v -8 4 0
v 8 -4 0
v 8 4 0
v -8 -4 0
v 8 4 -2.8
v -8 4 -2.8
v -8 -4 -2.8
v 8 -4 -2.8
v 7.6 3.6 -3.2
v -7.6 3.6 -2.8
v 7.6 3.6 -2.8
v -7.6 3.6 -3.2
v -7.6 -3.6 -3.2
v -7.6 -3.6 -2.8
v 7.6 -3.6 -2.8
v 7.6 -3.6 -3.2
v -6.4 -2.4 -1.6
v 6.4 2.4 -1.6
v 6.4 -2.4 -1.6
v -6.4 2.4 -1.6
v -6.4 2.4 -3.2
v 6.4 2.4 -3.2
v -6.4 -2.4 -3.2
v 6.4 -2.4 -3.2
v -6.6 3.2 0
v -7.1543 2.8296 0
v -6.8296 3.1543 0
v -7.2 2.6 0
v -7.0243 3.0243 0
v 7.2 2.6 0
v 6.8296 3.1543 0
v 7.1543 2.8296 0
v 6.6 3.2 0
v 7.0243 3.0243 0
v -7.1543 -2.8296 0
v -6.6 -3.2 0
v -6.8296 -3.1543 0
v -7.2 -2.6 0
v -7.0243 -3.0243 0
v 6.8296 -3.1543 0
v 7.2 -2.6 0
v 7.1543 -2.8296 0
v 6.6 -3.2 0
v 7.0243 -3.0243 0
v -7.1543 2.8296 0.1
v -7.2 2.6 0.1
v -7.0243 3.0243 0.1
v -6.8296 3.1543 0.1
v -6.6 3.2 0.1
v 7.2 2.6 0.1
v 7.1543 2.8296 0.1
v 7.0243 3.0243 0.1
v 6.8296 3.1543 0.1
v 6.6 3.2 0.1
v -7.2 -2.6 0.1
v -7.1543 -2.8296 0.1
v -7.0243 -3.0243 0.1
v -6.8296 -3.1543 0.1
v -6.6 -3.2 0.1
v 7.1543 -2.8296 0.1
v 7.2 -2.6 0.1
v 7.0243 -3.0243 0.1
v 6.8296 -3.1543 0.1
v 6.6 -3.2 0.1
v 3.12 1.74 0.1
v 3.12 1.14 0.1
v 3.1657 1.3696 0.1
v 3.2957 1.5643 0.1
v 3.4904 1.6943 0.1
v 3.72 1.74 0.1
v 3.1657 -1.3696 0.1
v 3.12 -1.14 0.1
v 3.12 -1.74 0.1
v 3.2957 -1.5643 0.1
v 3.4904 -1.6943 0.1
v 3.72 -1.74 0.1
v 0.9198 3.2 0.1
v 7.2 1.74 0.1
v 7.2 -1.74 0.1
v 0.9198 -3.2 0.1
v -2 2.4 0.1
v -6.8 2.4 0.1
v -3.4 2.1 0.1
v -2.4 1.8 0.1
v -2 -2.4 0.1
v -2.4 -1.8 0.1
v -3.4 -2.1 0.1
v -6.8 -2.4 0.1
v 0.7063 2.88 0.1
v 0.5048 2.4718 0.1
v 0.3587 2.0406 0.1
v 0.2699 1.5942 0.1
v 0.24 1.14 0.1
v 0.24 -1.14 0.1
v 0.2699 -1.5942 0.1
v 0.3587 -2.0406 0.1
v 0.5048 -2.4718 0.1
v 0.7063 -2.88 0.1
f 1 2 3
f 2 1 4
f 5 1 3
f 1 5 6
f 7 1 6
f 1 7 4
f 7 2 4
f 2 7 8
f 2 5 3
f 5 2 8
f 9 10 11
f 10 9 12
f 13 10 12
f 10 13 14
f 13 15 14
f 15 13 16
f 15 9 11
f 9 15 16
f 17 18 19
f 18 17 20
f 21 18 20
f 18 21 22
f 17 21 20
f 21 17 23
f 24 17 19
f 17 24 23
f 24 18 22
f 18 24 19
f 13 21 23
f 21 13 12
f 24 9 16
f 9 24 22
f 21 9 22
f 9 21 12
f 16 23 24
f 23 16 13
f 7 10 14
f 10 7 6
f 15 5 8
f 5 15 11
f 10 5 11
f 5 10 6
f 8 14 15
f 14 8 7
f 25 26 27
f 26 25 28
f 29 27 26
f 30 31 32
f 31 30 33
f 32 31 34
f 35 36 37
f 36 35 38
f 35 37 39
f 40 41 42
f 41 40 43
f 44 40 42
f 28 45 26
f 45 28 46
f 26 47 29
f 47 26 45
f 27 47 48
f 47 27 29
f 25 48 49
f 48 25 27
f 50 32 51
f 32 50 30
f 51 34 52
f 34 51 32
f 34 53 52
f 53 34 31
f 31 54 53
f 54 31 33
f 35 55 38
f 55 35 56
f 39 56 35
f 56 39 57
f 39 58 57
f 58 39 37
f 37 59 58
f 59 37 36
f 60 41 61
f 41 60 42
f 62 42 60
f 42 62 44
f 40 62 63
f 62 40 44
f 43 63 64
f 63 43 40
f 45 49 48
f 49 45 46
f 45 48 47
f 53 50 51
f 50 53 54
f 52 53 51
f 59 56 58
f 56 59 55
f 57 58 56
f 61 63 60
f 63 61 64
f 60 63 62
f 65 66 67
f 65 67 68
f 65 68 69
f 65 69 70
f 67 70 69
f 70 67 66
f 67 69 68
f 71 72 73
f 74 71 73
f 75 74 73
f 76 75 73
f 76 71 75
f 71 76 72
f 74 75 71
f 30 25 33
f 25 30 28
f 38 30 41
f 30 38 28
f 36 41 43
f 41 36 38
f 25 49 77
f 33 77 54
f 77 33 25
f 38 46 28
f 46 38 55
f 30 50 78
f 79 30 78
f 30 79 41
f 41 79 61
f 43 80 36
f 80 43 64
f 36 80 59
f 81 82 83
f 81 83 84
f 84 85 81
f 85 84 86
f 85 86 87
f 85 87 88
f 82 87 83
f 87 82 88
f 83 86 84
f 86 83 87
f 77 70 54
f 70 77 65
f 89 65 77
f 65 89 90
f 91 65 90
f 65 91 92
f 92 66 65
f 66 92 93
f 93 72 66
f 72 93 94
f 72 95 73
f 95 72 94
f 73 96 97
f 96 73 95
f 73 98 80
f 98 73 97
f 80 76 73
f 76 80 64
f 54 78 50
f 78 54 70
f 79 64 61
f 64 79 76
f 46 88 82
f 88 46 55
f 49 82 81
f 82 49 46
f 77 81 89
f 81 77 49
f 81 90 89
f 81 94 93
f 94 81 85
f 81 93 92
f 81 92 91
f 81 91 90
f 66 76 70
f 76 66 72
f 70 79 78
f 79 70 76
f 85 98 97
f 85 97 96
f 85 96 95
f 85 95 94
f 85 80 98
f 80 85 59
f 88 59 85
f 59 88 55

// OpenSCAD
// file: ../p/box5.scad
use <../lib.scad>
function ldraw_lib__box5() = [
// 0 Box with 5 Faces and All Edges
// 0 Name: box5.dat
// 0 Author: James Jessiman
// 0 !LDRAW_ORG Primitive UPDATE 2012-01
// 0 !LICENSE Licensed under CC BY 4.0 : see CAreadme.txt
// 
// 0 BFC CERTIFY CCW
  [0,"BFC","CERTIFY"],
  [0,"BFC","CCW"],
// 
// 0 !HISTORY 2002-04-03 [sbliss] Modified for BFC compliance
// 0 !HISTORY 2002-04-25 [PTadmin] Official Update 2002-02
// 0 !HISTORY 2007-06-24 [PTadmin] Header formatted for Contributor Agreement
// 0 !HISTORY 2008-07-01 [PTadmin] Official Update 2008-01
// 0 !HISTORY 2012-02-16 [Philo] Changed to CCW
// 0 !HISTORY 2012-03-30 [PTadmin] Official Update 2012-01
// 
// 
// 2 24 1 1 1 -1 1 1
  [2,24,1,1,1,-1,1,1],
// 2 24 -1 1 1 -1 1 -1
  [2,24,-1,1,1,-1,1,-1],
// 2 24 -1 1 -1 1 1 -1
  [2,24,-1,1,-1,1,1,-1],
// 2 24 1 1 -1 1 1 1
  [2,24,1,1,-1,1,1,1],
// 2 24 1 0 1 -1 0 1
  [2,24,1,0,1,-1,0,1],
// 2 24 -1 0 1 -1 0 -1
  [2,24,-1,0,1,-1,0,-1],
// 2 24 -1 0 -1 1 0 -1
  [2,24,-1,0,-1,1,0,-1],
// 2 24 1 0 -1 1 0 1
  [2,24,1,0,-1,1,0,1],
// 2 24 1 0 1 1 1 1
  [2,24,1,0,1,1,1,1],
// 2 24 -1 0 1 -1 1 1
  [2,24,-1,0,1,-1,1,1],
// 2 24 1 0 -1 1 1 -1
  [2,24,1,0,-1,1,1,-1],
// 2 24 -1 0 -1 -1 1 -1
  [2,24,-1,0,-1,-1,1,-1],
// 4 16 -1 1 1 1 1 1 1 1 -1 -1 1 -1
  [4,16,-1,1,1,1,1,1,1,1,-1,-1,1,-1],
// 4 16 -1 1 1 -1 0 1 1 0 1 1 1 1
  [4,16,-1,1,1,-1,0,1,1,0,1,1,1,1],
// 4 16 -1 1 -1 -1 0 -1 -1 0 1 -1 1 1
  [4,16,-1,1,-1,-1,0,-1,-1,0,1,-1,1,1],
// 4 16 1 1 -1 1 0 -1 -1 0 -1 -1 1 -1
  [4,16,1,1,-1,1,0,-1,-1,0,-1,-1,1,-1],
// 4 16 1 1 1 1 0 1 1 0 -1 1 1 -1
  [4,16,1,1,1,1,0,1,1,0,-1,1,1,-1],
];
module ldraw_lib__box5(step=0, col=false, unit=2/5, alt=false, line=0.2, solid=!$preview)
    makepoly(ldraw_lib__box5(), step=step, col=col, unit=unit, alt=alt, line=line, solid=solid);
ldraw_lib__box5(line=0.2);
// file: ../p/box4.scad
use <../lib.scad>
function ldraw_lib__box4() = [
// 0 Box with 4 Faces (2 Parallel Pairs) and All Edges
// 0 Name: box4.dat
// 0 Author: James Jessiman
// 0 !LDRAW_ORG Primitive UPDATE 2012-01
// 0 !LICENSE Licensed under CC BY 4.0 : see CAreadme.txt
// 
// 0 BFC CERTIFY CCW
  [0,"BFC","CERTIFY"],
  [0,"BFC","CCW"],
// 
// 0 !HISTORY 2002-04-03 [sbliss] Modified for BFC compliance
// 0 !HISTORY 2002-04-25 [PTadmin] Official Update 2002-02
// 0 !HISTORY 2007-06-24 [PTadmin] Header formatted for Contributor Agreement
// 0 !HISTORY 2008-07-01 [PTadmin] Official Update 2008-01
// 0 !HISTORY 2012-02-16 [Philo] Changed to CCW
// 0 !HISTORY 2012-03-30 [PTadmin] Official Update 2012-01
// 
// 
// 2 24 1 1 1 -1 1 1
  [2,24,1,1,1,-1,1,1],
// 2 24 -1 1 1 -1 1 -1
  [2,24,-1,1,1,-1,1,-1],
// 2 24 -1 1 -1 1 1 -1
  [2,24,-1,1,-1,1,1,-1],
// 2 24 1 1 -1 1 1 1
  [2,24,1,1,-1,1,1,1],
// 2 24 1 0 1 -1 0 1
  [2,24,1,0,1,-1,0,1],
// 2 24 -1 0 1 -1 0 -1
  [2,24,-1,0,1,-1,0,-1],
// 2 24 -1 0 -1 1 0 -1
  [2,24,-1,0,-1,1,0,-1],
// 2 24 1 0 -1 1 0 1
  [2,24,1,0,-1,1,0,1],
// 2 24 1 0 1 1 1 1
  [2,24,1,0,1,1,1,1],
// 2 24 -1 0 1 -1 1 1
  [2,24,-1,0,1,-1,1,1],
// 2 24 1 0 -1 1 1 -1
  [2,24,1,0,-1,1,1,-1],
// 2 24 -1 0 -1 -1 1 -1
  [2,24,-1,0,-1,-1,1,-1],
// 4 16 -1 1 1 -1 0 1 1 0 1 1 1 1
  [4,16,-1,1,1,-1,0,1,1,0,1,1,1,1],
// 4 16 -1 1 -1 -1 0 -1 -1 0 1 -1 1 1
  [4,16,-1,1,-1,-1,0,-1,-1,0,1,-1,1,1],
// 4 16 1 1 -1 1 0 -1 -1 0 -1 -1 1 -1
  [4,16,1,1,-1,1,0,-1,-1,0,-1,-1,1,-1],
// 4 16 1 1 1 1 0 1 1 0 -1 1 1 -1
  [4,16,1,1,1,1,0,1,1,0,-1,1,1,-1],
];
module ldraw_lib__box4(step=0, col=false, unit=2/5, alt=false, line=0.2, solid=!$preview)
    makepoly(ldraw_lib__box4(), step=step, col=col, unit=unit, alt=alt, line=line, solid=solid);
ldraw_lib__box4(line=0.2);
// file: ../p/1-4ndis.scad
use <../lib.scad>
function ldraw_lib__1_4ndis() = [
// 0 Disc Negative 0.25
// 0 Name: 1-4ndis.dat
// 0 Author: James Jessiman
// 0 !LDRAW_ORG Primitive UPDATE 2012-01
// 0 !LICENSE Licensed under CC BY 4.0 : see CAreadme.txt
// 
// 0 BFC CERTIFY CCW
  [0,"BFC","CERTIFY"],
  [0,"BFC","CCW"],
// 
// 0 !HISTORY 2002-03-23 [sbliss] Added BFC Statement
// 0 !HISTORY 2002-04-25 [PTadmin] Official Update 2002-02
// 0 !HISTORY 2007-06-22 [PTadmin] Header formatted for Contributor Agreement
// 0 !HISTORY 2008-07-01 [PTadmin] Official Update 2008-01
// 0 !HISTORY 2012-02-16 [Philo] Changed to CCW
// 0 !HISTORY 2012-03-30 [PTadmin] Official Update 2012-01
// 
// 
// 3 16 0.9239 0 0.3827 1 0 0 1 0 1
  [3,16,0.9239,0,0.3827,1,0,0,1,0,1],
// 3 16 0.7071 0 0.7071 0.9239 0 0.3827 1 0 1
  [3,16,0.7071,0,0.7071,0.9239,0,0.3827,1,0,1],
// 3 16 0.3827 0 0.9239 0.7071 0 0.7071 1 0 1
  [3,16,0.3827,0,0.9239,0.7071,0,0.7071,1,0,1],
// 3 16 0 0 1 0.3827 0 0.9239 1 0 1
  [3,16,0,0,1,0.3827,0,0.9239,1,0,1],
];
module ldraw_lib__1_4ndis(step=0, col=false, unit=2/5, alt=false, line=0.2, solid=!$preview)
    makepoly(ldraw_lib__1_4ndis(), step=step, col=col, unit=unit, alt=alt, line=line, solid=solid);
ldraw_lib__1_4ndis(line=0.2);
// file: ../p/1-4cyli.scad
use <../lib.scad>
function ldraw_lib__1_4cyli() = [
// 0 Cylinder 0.25
// 0 Name: 1-4cyli.dat
// 0 Author: James Jessiman
// 0 !LDRAW_ORG Primitive UPDATE 2012-01
// 0 !LICENSE Licensed under CC BY 4.0 : see CAreadme.txt
// 
// 0 BFC CERTIFY CCW
  [0,"BFC","CERTIFY"],
  [0,"BFC","CCW"],
// 
// 0 !HISTORY 2002-03-23 [sbliss] Added BFC statement.
// 0 !HISTORY 2002-04-25 [PTadmin] Official Update 2002-02
// 0 !HISTORY 2007-06-22 [PTadmin] Header formatted for Contributor Agreement
// 0 !HISTORY 2008-07-01 [PTadmin] Official Update 2008-01
// 0 !HISTORY 2012-02-16 [Philo] Changed to CCW
// 0 !HISTORY 2012-03-30 [PTadmin] Official Update 2012-01
// 
// 
// 4 16 1 1 0 0.9239 1 0.3827 0.9239 0 0.3827 1 0 0
  [4,16,1,1,0,0.9239,1,0.3827,0.9239,0,0.3827,1,0,0],
// 5 24 1 0 0 1 1 0 0.9239 0 0.3827 1 0 -1
  [5,24,1,0,0,1,1,0,0.9239,0,0.3827,1,0,-1],
// 4 16 0.9239 1 0.3827 0.7071 1 0.7071 0.7071 0 0.7071 0.9239 0 0.3827
  [4,16,0.9239,1,0.3827,0.7071,1,0.7071,0.7071,0,0.7071,0.9239,0,0.3827],
// 5 24 0.9239 0 0.3827 0.9239 1 0.3827 0.7071 0 0.7071 1 0 0
  [5,24,0.9239,0,0.3827,0.9239,1,0.3827,0.7071,0,0.7071,1,0,0],
// 4 16 0.7071 1 0.7071 0.3827 1 0.9239 0.3827 0 0.9239 0.7071 0 0.7071
  [4,16,0.7071,1,0.7071,0.3827,1,0.9239,0.3827,0,0.9239,0.7071,0,0.7071],
// 5 24 0.7071 0 0.7071 0.7071 1 0.7071 0.3827 0 0.9239 0.9239 0 0.3827
  [5,24,0.7071,0,0.7071,0.7071,1,0.7071,0.3827,0,0.9239,0.9239,0,0.3827],
// 4 16 0.3827 1 0.9239 0 1 1 0 0 1 0.3827 0 0.9239
  [4,16,0.3827,1,0.9239,0,1,1,0,0,1,0.3827,0,0.9239],
// 5 24 0.3827 0 0.9239 0.3827 1 0.9239 0 0 1 0.7071 0 0.7071
  [5,24,0.3827,0,0.9239,0.3827,1,0.9239,0,0,1,0.7071,0,0.7071],
// 5 24 0 0 1 0 1 1 0.3827 0 0.9239 -1 0 1
  [5,24,0,0,1,0,1,1,0.3827,0,0.9239,-1,0,1],
];
module ldraw_lib__1_4cyli(step=0, col=false, unit=2/5, alt=false, line=0.2, solid=!$preview)
    makepoly(ldraw_lib__1_4cyli(), step=step, col=col, unit=unit, alt=alt, line=line, solid=solid);
ldraw_lib__1_4cyli(line=0.2);
// file: ../p/1-4chrd.scad
use <../lib.scad>
function ldraw_lib__1_4chrd() = [
// 0 Chord 0.25
// 0 Name: 1-4chrd.dat
// 0 Author: Max Martin Richter [MMR1988]
// 0 !LDRAW_ORG Primitive UPDATE 2023-05
// 0 !LICENSE Licensed under CC BY 4.0 : see CAreadme.txt
// 
// 0 BFC CERTIFY CCW
  [0,"BFC","CERTIFY"],
  [0,"BFC","CCW"],
// 
// 0 !HISTORY 2004-04-22 [PTadmin] Official Update 2004-02
// 0 !HISTORY 2007-10-09 [PTadmin] Header formatted for Contributor Agreement
// 0 !HISTORY 2008-07-01 [PTadmin] Official Update 2008-01
// 0 !HISTORY 2012-08-02 [MMR1988] Re-creation with PrimGen2 and Rectifier
// 0 !HISTORY 2012-08-09 [PTadmin] Official Update 2012-02
// 0 !HISTORY 2023-10-27 [OrionP] Change author to MMR1988 from hafhead
// 0 !HISTORY 2023-10-31 [OrionP] Official Update 2023-05
// 
// 4 16 0.9239 0 0.3827 0.3827 0 0.9239 0 0 1 1 0 0
  [4,16,0.9239,0,0.3827,0.3827,0,0.9239,0,0,1,1,0,0],
// 3 16 0.7071 0 0.7071 0.3827 0 0.9239 0.9239 0 0.3827
  [3,16,0.7071,0,0.7071,0.3827,0,0.9239,0.9239,0,0.3827],
];
module ldraw_lib__1_4chrd(step=0, col=false, unit=2/5, alt=false, line=0.2, solid=!$preview)
    makepoly(ldraw_lib__1_4chrd(), step=step, col=col, unit=unit, alt=alt, line=line, solid=solid);
ldraw_lib__1_4chrd(line=0.2);
// file: s/3069bs01.scad
use <../../lib.scad>
use <../../p/box4.scad>
use <../../p/box5.scad>
function ldraw_lib__s__3069bs01() = [
// 0 ~Tile  1 x  2 with Groove without Top Face
// 0 Name: s\3069bs01.dat
// 0 Author: Santeri Piippo [arezey]
// 0 !LDRAW_ORG Subpart UPDATE 2010-02
// 0 !LICENSE Licensed under CC BY 4.0 : see CAreadme.txt
// 
// 0 BFC CERTIFY CCW
  [0,"BFC","CERTIFY"],
  [0,"BFC","CCW"],
// 
// 0 !HISTORY 2010-07-05 [PTadmin] Official Update 2010-02
// 
// 
// 1 16 0 0 0 20 0 0 0 7 0 0 0 10 box4.dat
  [1,16,0,0,0,20,0,0,0,7,0,0,0,10, ldraw_lib__box4()],
// 1 16 0 7 0 19 0 0 0 1 0 0 0 9 box4.dat
  [1,16,0,7,0,19,0,0,0,1,0,0,0,9, ldraw_lib__box4()],
// 0 BFC INVERTNEXT
  [0,"BFC","INVERTNEXT"],
// 1 16 0 8 0 16 0 0 0 -4 0 0 0 6 box5.dat
  [1,16,0,8,0,16,0,0,0,-4,0,0,0,6, ldraw_lib__box5()],
// 4 16 -19 8 9 -16 8 6 -16 8 -6 -19 8 -9
  [4,16,-19,8,9,-16,8,6,-16,8,-6,-19,8,-9],
// 4 16 19 8 -9 16 8 -6 16 8 6 19 8 9
  [4,16,19,8,-9,16,8,-6,16,8,6,19,8,9],
// 4 16 19 8 9 16 8 6 -16 8 6 -19 8 9
  [4,16,19,8,9,16,8,6,-16,8,6,-19,8,9],
// 4 16 -19 8 -9 -16 8 -6 16 8 -6 19 8 -9
  [4,16,-19,8,-9,-16,8,-6,16,8,-6,19,8,-9],
// 4 16 -20 7 10 -19 7 9 -19 7 -9 -20 7 -10
  [4,16,-20,7,10,-19,7,9,-19,7,-9,-20,7,-10],
// 4 16 20 7 -10 19 7 -9 19 7 9 20 7 10
  [4,16,20,7,-10,19,7,-9,19,7,9,20,7,10],
// 4 16 20 7 10 19 7 9 -19 7 9 -20 7 10
  [4,16,20,7,10,19,7,9,-19,7,9,-20,7,10],
// 4 16 -20 7 -10 -19 7 -9 19 7 -9 20 7 -10
  [4,16,-20,7,-10,-19,7,-9,19,7,-9,20,7,-10],
// 0 //
];
module ldraw_lib__s__3069bs01(step=0, col=false, unit=2/5, alt=false, line=0.2, solid=!$preview)
    makepoly(ldraw_lib__s__3069bs01(), step=step, col=col, unit=unit, alt=alt, line=line, solid=solid);
ldraw_lib__s__3069bs01(line=0.2);
// file: 3069b.scad
use <../lib.scad>
use <s/3069bs01.scad>
function ldraw_lib__3069b() = [
// 0 Tile  1 x  2 with Groove
// 0 Name: 3069b.dat
// 0 Author: Santeri Piippo [arezey]
// 0 !LDRAW_ORG Part UPDATE 2010-02
// 0 !LICENSE Licensed under CC BY 4.0 : see CAreadme.txt
// 
// 0 BFC CERTIFY CCW
  [0,"BFC","CERTIFY"],
  [0,"BFC","CCW"],
// 
// 0 !KEYWORDS BrickLink 3069
// 
// 0 !HISTORY 2010-07-05 [PTadmin] Official Update 2010-02
// 
// 
// 4 16 20 0 -10 20 0 10 -20 0 10 -20 0 -10
  [4,16,20,0,-10,20,0,10,-20,0,10,-20,0,-10],
// 1 16 0 0 0 1 0 0 0 1 0 0 0 1 s\3069bs01.dat
  [1,16,0,0,0,1,0,0,0,1,0,0,0,1, ldraw_lib__s__3069bs01()],
// 0 //
];
module ldraw_lib__3069b(step=0, col=false, unit=2/5, alt=false, line=0.2, solid=!$preview)
    makepoly(ldraw_lib__3069b(), step=step, col=col, unit=unit, alt=alt, line=line, solid=solid);
ldraw_lib__3069b(line=0.2);
// main file
use <../lib.scad>
use <3069b.scad>
use <6148328bi.scad>
function ldraw_lib__3069bd2c() = [
// 0 Tile  1 x  2 with Dark Grey Lines on White Background Sticker
// 0 Name: 3069bd2c.dat
// 0 Author: Vincent Messenet [Cheenzo]
// 0 !LDRAW_ORG Shortcut UPDATE 2026-05
// 0 !LICENSE Licensed under CC BY 4.0 : see CAreadme.txt
// 
// 0 BFC CERTIFY CCW
  [0,"BFC","CERTIFY"],
  [0,"BFC","CCW"],
// 
// 0 !CATEGORY Sticker Shortcut
// 
// 0 !KEYWORDS Bricklink 3069pb0682R, Porsche 919 Hybrid and 917K Pit Lane
// 0 !KEYWORDS set 75876, Speed Champions, Wheel arch ventilation
// 
// 0 !HISTORY 2026-05-31 [OrionP] Official Update 2026-05
// 
// 1 16 0 0 0 1 0 0 0 1 0 0 0 1 3069b.dat
  [1,16,0,0,0,1,0,0,0,1,0,0,0,1, ldraw_lib__3069b()],
// 1 16 0 0 0 1 0 0 0 1 0 0 0 1 6148328bi.dat
  [1,16,0,0,0,1,0,0,0,1,0,0,0,1, ldraw_lib__6148328bi()],
];
module ldraw_lib__3069bd2c(step=0, col=false, unit=2/5, alt=false, line=0.2, solid=!$preview)
    makepoly(ldraw_lib__3069bd2c(), step=step, col=col, unit=unit, alt=alt, line=line, solid=solid);
ldraw_lib__3069bd2c(line=0.2);
